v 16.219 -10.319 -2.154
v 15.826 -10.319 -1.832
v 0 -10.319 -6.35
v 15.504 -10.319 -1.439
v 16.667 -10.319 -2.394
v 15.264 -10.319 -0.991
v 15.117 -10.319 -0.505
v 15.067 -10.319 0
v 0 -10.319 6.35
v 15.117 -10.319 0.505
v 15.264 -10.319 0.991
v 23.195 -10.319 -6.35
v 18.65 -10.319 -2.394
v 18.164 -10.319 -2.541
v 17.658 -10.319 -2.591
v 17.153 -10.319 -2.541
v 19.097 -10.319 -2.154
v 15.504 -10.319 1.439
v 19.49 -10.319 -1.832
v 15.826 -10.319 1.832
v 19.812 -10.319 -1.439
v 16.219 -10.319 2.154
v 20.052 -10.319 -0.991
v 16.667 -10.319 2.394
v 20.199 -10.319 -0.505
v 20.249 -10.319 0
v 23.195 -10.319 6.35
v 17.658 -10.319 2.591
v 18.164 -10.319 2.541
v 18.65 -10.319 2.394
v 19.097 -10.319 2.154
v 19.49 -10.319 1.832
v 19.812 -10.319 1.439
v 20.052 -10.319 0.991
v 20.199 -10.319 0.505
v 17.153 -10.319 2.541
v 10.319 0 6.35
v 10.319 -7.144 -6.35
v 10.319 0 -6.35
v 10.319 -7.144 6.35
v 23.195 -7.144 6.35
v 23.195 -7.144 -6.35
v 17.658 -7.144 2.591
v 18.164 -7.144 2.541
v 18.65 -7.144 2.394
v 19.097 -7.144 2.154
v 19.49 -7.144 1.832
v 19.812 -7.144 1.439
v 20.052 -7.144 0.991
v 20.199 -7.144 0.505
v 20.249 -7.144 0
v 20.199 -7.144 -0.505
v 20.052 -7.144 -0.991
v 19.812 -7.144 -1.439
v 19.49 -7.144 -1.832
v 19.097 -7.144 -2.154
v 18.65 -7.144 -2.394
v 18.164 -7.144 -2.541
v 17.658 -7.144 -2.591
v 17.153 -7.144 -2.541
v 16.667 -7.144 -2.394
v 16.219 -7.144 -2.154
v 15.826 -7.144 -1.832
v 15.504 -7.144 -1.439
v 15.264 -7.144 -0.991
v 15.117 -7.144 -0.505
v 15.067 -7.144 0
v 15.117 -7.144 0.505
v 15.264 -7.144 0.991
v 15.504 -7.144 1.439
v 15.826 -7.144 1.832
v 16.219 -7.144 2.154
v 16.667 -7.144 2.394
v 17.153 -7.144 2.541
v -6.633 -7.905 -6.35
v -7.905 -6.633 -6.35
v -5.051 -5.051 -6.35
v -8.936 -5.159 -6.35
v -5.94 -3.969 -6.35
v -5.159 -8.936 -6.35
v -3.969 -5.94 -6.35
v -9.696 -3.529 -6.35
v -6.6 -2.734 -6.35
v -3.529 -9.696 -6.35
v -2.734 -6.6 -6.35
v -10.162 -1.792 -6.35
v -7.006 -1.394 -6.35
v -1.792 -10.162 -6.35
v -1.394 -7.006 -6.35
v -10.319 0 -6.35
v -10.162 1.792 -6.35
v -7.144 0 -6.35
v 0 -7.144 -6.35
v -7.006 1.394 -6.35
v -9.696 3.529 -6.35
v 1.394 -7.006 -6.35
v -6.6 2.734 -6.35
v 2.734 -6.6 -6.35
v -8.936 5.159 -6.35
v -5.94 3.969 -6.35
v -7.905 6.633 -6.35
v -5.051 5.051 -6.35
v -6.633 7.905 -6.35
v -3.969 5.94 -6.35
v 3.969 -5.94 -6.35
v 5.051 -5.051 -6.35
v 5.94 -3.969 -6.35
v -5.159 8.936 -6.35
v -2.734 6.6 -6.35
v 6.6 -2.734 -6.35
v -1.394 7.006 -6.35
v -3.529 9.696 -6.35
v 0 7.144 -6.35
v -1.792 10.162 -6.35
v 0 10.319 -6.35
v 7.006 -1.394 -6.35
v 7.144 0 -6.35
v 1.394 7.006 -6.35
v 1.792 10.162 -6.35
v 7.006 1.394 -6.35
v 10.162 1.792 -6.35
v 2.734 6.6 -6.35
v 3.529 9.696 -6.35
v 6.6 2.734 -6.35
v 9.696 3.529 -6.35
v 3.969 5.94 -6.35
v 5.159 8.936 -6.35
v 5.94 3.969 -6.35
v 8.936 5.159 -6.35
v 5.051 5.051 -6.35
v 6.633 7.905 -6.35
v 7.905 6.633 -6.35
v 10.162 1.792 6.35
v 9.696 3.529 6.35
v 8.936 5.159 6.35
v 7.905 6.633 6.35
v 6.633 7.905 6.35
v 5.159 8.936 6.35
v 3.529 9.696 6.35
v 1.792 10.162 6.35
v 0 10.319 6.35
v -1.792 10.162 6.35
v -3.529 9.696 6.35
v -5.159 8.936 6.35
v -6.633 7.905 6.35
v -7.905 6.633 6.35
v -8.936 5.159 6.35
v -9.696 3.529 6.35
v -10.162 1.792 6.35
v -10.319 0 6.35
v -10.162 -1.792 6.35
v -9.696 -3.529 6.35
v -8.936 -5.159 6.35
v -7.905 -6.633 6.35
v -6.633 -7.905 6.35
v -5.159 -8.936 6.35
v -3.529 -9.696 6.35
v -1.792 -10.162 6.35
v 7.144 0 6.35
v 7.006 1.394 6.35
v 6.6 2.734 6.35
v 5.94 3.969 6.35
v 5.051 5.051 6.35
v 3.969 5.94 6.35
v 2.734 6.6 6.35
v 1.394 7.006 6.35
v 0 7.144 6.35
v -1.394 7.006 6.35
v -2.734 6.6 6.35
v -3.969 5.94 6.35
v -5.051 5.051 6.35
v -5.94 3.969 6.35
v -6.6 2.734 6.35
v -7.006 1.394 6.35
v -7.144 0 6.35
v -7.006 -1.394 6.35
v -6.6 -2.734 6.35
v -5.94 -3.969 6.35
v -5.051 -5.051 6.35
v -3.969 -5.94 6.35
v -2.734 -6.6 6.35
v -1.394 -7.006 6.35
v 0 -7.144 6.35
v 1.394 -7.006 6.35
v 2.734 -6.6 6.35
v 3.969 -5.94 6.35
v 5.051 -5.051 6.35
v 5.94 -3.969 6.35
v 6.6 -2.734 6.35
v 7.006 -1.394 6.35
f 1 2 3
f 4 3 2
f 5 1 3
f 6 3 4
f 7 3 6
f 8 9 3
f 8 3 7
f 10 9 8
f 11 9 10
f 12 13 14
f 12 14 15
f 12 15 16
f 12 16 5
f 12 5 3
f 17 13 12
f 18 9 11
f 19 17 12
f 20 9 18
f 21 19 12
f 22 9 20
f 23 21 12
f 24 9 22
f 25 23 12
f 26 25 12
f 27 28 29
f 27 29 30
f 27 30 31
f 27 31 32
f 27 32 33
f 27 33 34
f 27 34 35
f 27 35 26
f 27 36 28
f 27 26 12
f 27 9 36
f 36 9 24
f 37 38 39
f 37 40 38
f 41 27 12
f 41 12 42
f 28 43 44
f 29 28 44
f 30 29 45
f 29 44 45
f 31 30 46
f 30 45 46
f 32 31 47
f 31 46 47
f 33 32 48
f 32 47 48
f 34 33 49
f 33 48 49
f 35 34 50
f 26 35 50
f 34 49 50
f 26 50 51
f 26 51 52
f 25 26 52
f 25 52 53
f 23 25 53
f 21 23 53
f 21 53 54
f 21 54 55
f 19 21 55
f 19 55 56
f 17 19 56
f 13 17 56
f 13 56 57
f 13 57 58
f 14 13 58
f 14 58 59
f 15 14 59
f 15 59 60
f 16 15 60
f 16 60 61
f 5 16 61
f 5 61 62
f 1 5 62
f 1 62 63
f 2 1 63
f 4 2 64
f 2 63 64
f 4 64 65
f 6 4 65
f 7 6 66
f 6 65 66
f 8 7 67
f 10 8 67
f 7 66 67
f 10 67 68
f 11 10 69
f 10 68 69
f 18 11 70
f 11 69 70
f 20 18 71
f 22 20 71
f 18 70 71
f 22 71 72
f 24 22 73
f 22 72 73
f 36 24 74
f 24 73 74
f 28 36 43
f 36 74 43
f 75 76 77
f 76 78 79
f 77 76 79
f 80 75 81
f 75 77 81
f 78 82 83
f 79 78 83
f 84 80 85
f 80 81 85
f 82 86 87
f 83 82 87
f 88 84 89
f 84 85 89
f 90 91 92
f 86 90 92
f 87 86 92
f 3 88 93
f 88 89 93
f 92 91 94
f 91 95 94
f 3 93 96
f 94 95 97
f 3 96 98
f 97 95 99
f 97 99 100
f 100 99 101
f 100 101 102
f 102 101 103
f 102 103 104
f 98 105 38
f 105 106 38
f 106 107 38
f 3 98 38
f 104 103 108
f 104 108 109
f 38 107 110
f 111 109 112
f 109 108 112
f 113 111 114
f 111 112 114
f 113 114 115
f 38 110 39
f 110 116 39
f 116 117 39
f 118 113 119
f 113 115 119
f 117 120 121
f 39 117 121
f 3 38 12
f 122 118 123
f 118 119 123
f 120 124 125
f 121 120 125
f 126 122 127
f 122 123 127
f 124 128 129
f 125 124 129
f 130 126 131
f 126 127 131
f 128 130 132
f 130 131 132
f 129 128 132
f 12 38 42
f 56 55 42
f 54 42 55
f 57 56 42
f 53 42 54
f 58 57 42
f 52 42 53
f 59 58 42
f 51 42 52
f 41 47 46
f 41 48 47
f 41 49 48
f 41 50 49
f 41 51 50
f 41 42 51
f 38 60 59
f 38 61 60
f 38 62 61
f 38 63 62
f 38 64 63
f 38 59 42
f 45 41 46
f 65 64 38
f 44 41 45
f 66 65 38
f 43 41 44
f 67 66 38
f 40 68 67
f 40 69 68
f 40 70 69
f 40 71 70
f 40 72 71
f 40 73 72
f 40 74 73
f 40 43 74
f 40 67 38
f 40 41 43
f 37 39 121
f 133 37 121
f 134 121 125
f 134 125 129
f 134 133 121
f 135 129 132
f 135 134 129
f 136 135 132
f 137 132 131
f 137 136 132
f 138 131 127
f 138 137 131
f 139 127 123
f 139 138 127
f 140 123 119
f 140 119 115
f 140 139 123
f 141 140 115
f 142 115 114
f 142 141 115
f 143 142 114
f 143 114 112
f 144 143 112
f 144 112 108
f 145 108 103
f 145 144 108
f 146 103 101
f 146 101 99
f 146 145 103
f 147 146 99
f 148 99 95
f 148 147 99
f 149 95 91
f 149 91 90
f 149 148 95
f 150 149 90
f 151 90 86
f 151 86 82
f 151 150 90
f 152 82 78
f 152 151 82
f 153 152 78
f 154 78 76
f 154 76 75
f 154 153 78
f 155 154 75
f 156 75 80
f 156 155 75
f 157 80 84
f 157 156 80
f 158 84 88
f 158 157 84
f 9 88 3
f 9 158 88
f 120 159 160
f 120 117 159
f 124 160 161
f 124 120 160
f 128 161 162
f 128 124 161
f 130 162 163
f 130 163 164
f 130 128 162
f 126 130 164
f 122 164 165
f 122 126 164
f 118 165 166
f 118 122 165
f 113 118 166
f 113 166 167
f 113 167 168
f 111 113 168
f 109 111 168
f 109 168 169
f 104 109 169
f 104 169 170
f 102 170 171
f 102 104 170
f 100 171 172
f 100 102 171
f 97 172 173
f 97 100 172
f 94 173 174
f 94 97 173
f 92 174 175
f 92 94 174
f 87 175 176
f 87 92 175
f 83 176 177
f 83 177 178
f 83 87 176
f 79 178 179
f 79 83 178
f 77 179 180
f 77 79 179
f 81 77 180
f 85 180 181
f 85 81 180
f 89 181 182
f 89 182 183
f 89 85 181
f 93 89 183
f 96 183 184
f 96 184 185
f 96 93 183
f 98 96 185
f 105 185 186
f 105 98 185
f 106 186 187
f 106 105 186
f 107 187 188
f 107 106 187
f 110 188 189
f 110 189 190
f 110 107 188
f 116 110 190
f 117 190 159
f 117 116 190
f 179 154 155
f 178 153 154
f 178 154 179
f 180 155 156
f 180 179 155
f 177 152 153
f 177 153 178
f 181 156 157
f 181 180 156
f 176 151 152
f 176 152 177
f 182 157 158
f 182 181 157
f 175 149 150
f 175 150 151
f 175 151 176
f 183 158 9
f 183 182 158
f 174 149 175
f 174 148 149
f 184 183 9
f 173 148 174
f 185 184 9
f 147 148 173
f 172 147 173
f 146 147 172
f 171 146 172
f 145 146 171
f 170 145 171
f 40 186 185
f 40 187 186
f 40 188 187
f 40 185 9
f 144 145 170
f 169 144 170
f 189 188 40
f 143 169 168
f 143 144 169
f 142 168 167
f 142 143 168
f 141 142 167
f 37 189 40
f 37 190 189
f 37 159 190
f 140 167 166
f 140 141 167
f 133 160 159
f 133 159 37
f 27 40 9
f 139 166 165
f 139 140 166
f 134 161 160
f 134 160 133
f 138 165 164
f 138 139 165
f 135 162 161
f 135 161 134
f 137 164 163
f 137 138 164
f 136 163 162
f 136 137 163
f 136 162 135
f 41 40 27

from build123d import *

# Parameters (mm, degrees)
SKETCH1_R           = 7.14375
BOSS_EXTRUDE1_DEPTH = 6.35
SKETCH2_R           = 2.5908
CUT_EXTRUDE1_DEPTH  = 11.31875


with BuildPart() as part:
    # Sketch1 → Boss-Extrude1 (new body, symmetric)
    with BuildSketch(Plane.XY):
        with BuildLine():
            Line((0, -10.31875), (23.19528, -10.31875))
            Line((23.19528, -10.31875), (23.19528, -7.14375))
            Line((23.19528, -7.14375), (10.31875, -7.14375))
            Line((10.31875, -7.14375), (10.31875, 0))
            ThreePointArc((10.31875, 0), (-7.296458098, 7.296458098), (0, -10.31875))
        make_face()
        Circle(SKETCH1_R, mode=Mode.SUBTRACT)
    extrude(amount=BOSS_EXTRUDE1_DEPTH, both=True)

    # Sketch2 → Cut-Extrude1 (cut, through all)
    with BuildSketch(Plane(origin=(0, 0, 0), x_dir=(1, 0, 0), z_dir=(0, 1, 0))):
        with Locations(Location((17.65808, 0, 0), (0, 0, 270))):  # turned: the seam where the file's is
            Circle(SKETCH2_R)
    extrude(amount=-CUT_EXTRUDE1_DEPTH, mode=Mode.SUBTRACT)


solid = part.part
